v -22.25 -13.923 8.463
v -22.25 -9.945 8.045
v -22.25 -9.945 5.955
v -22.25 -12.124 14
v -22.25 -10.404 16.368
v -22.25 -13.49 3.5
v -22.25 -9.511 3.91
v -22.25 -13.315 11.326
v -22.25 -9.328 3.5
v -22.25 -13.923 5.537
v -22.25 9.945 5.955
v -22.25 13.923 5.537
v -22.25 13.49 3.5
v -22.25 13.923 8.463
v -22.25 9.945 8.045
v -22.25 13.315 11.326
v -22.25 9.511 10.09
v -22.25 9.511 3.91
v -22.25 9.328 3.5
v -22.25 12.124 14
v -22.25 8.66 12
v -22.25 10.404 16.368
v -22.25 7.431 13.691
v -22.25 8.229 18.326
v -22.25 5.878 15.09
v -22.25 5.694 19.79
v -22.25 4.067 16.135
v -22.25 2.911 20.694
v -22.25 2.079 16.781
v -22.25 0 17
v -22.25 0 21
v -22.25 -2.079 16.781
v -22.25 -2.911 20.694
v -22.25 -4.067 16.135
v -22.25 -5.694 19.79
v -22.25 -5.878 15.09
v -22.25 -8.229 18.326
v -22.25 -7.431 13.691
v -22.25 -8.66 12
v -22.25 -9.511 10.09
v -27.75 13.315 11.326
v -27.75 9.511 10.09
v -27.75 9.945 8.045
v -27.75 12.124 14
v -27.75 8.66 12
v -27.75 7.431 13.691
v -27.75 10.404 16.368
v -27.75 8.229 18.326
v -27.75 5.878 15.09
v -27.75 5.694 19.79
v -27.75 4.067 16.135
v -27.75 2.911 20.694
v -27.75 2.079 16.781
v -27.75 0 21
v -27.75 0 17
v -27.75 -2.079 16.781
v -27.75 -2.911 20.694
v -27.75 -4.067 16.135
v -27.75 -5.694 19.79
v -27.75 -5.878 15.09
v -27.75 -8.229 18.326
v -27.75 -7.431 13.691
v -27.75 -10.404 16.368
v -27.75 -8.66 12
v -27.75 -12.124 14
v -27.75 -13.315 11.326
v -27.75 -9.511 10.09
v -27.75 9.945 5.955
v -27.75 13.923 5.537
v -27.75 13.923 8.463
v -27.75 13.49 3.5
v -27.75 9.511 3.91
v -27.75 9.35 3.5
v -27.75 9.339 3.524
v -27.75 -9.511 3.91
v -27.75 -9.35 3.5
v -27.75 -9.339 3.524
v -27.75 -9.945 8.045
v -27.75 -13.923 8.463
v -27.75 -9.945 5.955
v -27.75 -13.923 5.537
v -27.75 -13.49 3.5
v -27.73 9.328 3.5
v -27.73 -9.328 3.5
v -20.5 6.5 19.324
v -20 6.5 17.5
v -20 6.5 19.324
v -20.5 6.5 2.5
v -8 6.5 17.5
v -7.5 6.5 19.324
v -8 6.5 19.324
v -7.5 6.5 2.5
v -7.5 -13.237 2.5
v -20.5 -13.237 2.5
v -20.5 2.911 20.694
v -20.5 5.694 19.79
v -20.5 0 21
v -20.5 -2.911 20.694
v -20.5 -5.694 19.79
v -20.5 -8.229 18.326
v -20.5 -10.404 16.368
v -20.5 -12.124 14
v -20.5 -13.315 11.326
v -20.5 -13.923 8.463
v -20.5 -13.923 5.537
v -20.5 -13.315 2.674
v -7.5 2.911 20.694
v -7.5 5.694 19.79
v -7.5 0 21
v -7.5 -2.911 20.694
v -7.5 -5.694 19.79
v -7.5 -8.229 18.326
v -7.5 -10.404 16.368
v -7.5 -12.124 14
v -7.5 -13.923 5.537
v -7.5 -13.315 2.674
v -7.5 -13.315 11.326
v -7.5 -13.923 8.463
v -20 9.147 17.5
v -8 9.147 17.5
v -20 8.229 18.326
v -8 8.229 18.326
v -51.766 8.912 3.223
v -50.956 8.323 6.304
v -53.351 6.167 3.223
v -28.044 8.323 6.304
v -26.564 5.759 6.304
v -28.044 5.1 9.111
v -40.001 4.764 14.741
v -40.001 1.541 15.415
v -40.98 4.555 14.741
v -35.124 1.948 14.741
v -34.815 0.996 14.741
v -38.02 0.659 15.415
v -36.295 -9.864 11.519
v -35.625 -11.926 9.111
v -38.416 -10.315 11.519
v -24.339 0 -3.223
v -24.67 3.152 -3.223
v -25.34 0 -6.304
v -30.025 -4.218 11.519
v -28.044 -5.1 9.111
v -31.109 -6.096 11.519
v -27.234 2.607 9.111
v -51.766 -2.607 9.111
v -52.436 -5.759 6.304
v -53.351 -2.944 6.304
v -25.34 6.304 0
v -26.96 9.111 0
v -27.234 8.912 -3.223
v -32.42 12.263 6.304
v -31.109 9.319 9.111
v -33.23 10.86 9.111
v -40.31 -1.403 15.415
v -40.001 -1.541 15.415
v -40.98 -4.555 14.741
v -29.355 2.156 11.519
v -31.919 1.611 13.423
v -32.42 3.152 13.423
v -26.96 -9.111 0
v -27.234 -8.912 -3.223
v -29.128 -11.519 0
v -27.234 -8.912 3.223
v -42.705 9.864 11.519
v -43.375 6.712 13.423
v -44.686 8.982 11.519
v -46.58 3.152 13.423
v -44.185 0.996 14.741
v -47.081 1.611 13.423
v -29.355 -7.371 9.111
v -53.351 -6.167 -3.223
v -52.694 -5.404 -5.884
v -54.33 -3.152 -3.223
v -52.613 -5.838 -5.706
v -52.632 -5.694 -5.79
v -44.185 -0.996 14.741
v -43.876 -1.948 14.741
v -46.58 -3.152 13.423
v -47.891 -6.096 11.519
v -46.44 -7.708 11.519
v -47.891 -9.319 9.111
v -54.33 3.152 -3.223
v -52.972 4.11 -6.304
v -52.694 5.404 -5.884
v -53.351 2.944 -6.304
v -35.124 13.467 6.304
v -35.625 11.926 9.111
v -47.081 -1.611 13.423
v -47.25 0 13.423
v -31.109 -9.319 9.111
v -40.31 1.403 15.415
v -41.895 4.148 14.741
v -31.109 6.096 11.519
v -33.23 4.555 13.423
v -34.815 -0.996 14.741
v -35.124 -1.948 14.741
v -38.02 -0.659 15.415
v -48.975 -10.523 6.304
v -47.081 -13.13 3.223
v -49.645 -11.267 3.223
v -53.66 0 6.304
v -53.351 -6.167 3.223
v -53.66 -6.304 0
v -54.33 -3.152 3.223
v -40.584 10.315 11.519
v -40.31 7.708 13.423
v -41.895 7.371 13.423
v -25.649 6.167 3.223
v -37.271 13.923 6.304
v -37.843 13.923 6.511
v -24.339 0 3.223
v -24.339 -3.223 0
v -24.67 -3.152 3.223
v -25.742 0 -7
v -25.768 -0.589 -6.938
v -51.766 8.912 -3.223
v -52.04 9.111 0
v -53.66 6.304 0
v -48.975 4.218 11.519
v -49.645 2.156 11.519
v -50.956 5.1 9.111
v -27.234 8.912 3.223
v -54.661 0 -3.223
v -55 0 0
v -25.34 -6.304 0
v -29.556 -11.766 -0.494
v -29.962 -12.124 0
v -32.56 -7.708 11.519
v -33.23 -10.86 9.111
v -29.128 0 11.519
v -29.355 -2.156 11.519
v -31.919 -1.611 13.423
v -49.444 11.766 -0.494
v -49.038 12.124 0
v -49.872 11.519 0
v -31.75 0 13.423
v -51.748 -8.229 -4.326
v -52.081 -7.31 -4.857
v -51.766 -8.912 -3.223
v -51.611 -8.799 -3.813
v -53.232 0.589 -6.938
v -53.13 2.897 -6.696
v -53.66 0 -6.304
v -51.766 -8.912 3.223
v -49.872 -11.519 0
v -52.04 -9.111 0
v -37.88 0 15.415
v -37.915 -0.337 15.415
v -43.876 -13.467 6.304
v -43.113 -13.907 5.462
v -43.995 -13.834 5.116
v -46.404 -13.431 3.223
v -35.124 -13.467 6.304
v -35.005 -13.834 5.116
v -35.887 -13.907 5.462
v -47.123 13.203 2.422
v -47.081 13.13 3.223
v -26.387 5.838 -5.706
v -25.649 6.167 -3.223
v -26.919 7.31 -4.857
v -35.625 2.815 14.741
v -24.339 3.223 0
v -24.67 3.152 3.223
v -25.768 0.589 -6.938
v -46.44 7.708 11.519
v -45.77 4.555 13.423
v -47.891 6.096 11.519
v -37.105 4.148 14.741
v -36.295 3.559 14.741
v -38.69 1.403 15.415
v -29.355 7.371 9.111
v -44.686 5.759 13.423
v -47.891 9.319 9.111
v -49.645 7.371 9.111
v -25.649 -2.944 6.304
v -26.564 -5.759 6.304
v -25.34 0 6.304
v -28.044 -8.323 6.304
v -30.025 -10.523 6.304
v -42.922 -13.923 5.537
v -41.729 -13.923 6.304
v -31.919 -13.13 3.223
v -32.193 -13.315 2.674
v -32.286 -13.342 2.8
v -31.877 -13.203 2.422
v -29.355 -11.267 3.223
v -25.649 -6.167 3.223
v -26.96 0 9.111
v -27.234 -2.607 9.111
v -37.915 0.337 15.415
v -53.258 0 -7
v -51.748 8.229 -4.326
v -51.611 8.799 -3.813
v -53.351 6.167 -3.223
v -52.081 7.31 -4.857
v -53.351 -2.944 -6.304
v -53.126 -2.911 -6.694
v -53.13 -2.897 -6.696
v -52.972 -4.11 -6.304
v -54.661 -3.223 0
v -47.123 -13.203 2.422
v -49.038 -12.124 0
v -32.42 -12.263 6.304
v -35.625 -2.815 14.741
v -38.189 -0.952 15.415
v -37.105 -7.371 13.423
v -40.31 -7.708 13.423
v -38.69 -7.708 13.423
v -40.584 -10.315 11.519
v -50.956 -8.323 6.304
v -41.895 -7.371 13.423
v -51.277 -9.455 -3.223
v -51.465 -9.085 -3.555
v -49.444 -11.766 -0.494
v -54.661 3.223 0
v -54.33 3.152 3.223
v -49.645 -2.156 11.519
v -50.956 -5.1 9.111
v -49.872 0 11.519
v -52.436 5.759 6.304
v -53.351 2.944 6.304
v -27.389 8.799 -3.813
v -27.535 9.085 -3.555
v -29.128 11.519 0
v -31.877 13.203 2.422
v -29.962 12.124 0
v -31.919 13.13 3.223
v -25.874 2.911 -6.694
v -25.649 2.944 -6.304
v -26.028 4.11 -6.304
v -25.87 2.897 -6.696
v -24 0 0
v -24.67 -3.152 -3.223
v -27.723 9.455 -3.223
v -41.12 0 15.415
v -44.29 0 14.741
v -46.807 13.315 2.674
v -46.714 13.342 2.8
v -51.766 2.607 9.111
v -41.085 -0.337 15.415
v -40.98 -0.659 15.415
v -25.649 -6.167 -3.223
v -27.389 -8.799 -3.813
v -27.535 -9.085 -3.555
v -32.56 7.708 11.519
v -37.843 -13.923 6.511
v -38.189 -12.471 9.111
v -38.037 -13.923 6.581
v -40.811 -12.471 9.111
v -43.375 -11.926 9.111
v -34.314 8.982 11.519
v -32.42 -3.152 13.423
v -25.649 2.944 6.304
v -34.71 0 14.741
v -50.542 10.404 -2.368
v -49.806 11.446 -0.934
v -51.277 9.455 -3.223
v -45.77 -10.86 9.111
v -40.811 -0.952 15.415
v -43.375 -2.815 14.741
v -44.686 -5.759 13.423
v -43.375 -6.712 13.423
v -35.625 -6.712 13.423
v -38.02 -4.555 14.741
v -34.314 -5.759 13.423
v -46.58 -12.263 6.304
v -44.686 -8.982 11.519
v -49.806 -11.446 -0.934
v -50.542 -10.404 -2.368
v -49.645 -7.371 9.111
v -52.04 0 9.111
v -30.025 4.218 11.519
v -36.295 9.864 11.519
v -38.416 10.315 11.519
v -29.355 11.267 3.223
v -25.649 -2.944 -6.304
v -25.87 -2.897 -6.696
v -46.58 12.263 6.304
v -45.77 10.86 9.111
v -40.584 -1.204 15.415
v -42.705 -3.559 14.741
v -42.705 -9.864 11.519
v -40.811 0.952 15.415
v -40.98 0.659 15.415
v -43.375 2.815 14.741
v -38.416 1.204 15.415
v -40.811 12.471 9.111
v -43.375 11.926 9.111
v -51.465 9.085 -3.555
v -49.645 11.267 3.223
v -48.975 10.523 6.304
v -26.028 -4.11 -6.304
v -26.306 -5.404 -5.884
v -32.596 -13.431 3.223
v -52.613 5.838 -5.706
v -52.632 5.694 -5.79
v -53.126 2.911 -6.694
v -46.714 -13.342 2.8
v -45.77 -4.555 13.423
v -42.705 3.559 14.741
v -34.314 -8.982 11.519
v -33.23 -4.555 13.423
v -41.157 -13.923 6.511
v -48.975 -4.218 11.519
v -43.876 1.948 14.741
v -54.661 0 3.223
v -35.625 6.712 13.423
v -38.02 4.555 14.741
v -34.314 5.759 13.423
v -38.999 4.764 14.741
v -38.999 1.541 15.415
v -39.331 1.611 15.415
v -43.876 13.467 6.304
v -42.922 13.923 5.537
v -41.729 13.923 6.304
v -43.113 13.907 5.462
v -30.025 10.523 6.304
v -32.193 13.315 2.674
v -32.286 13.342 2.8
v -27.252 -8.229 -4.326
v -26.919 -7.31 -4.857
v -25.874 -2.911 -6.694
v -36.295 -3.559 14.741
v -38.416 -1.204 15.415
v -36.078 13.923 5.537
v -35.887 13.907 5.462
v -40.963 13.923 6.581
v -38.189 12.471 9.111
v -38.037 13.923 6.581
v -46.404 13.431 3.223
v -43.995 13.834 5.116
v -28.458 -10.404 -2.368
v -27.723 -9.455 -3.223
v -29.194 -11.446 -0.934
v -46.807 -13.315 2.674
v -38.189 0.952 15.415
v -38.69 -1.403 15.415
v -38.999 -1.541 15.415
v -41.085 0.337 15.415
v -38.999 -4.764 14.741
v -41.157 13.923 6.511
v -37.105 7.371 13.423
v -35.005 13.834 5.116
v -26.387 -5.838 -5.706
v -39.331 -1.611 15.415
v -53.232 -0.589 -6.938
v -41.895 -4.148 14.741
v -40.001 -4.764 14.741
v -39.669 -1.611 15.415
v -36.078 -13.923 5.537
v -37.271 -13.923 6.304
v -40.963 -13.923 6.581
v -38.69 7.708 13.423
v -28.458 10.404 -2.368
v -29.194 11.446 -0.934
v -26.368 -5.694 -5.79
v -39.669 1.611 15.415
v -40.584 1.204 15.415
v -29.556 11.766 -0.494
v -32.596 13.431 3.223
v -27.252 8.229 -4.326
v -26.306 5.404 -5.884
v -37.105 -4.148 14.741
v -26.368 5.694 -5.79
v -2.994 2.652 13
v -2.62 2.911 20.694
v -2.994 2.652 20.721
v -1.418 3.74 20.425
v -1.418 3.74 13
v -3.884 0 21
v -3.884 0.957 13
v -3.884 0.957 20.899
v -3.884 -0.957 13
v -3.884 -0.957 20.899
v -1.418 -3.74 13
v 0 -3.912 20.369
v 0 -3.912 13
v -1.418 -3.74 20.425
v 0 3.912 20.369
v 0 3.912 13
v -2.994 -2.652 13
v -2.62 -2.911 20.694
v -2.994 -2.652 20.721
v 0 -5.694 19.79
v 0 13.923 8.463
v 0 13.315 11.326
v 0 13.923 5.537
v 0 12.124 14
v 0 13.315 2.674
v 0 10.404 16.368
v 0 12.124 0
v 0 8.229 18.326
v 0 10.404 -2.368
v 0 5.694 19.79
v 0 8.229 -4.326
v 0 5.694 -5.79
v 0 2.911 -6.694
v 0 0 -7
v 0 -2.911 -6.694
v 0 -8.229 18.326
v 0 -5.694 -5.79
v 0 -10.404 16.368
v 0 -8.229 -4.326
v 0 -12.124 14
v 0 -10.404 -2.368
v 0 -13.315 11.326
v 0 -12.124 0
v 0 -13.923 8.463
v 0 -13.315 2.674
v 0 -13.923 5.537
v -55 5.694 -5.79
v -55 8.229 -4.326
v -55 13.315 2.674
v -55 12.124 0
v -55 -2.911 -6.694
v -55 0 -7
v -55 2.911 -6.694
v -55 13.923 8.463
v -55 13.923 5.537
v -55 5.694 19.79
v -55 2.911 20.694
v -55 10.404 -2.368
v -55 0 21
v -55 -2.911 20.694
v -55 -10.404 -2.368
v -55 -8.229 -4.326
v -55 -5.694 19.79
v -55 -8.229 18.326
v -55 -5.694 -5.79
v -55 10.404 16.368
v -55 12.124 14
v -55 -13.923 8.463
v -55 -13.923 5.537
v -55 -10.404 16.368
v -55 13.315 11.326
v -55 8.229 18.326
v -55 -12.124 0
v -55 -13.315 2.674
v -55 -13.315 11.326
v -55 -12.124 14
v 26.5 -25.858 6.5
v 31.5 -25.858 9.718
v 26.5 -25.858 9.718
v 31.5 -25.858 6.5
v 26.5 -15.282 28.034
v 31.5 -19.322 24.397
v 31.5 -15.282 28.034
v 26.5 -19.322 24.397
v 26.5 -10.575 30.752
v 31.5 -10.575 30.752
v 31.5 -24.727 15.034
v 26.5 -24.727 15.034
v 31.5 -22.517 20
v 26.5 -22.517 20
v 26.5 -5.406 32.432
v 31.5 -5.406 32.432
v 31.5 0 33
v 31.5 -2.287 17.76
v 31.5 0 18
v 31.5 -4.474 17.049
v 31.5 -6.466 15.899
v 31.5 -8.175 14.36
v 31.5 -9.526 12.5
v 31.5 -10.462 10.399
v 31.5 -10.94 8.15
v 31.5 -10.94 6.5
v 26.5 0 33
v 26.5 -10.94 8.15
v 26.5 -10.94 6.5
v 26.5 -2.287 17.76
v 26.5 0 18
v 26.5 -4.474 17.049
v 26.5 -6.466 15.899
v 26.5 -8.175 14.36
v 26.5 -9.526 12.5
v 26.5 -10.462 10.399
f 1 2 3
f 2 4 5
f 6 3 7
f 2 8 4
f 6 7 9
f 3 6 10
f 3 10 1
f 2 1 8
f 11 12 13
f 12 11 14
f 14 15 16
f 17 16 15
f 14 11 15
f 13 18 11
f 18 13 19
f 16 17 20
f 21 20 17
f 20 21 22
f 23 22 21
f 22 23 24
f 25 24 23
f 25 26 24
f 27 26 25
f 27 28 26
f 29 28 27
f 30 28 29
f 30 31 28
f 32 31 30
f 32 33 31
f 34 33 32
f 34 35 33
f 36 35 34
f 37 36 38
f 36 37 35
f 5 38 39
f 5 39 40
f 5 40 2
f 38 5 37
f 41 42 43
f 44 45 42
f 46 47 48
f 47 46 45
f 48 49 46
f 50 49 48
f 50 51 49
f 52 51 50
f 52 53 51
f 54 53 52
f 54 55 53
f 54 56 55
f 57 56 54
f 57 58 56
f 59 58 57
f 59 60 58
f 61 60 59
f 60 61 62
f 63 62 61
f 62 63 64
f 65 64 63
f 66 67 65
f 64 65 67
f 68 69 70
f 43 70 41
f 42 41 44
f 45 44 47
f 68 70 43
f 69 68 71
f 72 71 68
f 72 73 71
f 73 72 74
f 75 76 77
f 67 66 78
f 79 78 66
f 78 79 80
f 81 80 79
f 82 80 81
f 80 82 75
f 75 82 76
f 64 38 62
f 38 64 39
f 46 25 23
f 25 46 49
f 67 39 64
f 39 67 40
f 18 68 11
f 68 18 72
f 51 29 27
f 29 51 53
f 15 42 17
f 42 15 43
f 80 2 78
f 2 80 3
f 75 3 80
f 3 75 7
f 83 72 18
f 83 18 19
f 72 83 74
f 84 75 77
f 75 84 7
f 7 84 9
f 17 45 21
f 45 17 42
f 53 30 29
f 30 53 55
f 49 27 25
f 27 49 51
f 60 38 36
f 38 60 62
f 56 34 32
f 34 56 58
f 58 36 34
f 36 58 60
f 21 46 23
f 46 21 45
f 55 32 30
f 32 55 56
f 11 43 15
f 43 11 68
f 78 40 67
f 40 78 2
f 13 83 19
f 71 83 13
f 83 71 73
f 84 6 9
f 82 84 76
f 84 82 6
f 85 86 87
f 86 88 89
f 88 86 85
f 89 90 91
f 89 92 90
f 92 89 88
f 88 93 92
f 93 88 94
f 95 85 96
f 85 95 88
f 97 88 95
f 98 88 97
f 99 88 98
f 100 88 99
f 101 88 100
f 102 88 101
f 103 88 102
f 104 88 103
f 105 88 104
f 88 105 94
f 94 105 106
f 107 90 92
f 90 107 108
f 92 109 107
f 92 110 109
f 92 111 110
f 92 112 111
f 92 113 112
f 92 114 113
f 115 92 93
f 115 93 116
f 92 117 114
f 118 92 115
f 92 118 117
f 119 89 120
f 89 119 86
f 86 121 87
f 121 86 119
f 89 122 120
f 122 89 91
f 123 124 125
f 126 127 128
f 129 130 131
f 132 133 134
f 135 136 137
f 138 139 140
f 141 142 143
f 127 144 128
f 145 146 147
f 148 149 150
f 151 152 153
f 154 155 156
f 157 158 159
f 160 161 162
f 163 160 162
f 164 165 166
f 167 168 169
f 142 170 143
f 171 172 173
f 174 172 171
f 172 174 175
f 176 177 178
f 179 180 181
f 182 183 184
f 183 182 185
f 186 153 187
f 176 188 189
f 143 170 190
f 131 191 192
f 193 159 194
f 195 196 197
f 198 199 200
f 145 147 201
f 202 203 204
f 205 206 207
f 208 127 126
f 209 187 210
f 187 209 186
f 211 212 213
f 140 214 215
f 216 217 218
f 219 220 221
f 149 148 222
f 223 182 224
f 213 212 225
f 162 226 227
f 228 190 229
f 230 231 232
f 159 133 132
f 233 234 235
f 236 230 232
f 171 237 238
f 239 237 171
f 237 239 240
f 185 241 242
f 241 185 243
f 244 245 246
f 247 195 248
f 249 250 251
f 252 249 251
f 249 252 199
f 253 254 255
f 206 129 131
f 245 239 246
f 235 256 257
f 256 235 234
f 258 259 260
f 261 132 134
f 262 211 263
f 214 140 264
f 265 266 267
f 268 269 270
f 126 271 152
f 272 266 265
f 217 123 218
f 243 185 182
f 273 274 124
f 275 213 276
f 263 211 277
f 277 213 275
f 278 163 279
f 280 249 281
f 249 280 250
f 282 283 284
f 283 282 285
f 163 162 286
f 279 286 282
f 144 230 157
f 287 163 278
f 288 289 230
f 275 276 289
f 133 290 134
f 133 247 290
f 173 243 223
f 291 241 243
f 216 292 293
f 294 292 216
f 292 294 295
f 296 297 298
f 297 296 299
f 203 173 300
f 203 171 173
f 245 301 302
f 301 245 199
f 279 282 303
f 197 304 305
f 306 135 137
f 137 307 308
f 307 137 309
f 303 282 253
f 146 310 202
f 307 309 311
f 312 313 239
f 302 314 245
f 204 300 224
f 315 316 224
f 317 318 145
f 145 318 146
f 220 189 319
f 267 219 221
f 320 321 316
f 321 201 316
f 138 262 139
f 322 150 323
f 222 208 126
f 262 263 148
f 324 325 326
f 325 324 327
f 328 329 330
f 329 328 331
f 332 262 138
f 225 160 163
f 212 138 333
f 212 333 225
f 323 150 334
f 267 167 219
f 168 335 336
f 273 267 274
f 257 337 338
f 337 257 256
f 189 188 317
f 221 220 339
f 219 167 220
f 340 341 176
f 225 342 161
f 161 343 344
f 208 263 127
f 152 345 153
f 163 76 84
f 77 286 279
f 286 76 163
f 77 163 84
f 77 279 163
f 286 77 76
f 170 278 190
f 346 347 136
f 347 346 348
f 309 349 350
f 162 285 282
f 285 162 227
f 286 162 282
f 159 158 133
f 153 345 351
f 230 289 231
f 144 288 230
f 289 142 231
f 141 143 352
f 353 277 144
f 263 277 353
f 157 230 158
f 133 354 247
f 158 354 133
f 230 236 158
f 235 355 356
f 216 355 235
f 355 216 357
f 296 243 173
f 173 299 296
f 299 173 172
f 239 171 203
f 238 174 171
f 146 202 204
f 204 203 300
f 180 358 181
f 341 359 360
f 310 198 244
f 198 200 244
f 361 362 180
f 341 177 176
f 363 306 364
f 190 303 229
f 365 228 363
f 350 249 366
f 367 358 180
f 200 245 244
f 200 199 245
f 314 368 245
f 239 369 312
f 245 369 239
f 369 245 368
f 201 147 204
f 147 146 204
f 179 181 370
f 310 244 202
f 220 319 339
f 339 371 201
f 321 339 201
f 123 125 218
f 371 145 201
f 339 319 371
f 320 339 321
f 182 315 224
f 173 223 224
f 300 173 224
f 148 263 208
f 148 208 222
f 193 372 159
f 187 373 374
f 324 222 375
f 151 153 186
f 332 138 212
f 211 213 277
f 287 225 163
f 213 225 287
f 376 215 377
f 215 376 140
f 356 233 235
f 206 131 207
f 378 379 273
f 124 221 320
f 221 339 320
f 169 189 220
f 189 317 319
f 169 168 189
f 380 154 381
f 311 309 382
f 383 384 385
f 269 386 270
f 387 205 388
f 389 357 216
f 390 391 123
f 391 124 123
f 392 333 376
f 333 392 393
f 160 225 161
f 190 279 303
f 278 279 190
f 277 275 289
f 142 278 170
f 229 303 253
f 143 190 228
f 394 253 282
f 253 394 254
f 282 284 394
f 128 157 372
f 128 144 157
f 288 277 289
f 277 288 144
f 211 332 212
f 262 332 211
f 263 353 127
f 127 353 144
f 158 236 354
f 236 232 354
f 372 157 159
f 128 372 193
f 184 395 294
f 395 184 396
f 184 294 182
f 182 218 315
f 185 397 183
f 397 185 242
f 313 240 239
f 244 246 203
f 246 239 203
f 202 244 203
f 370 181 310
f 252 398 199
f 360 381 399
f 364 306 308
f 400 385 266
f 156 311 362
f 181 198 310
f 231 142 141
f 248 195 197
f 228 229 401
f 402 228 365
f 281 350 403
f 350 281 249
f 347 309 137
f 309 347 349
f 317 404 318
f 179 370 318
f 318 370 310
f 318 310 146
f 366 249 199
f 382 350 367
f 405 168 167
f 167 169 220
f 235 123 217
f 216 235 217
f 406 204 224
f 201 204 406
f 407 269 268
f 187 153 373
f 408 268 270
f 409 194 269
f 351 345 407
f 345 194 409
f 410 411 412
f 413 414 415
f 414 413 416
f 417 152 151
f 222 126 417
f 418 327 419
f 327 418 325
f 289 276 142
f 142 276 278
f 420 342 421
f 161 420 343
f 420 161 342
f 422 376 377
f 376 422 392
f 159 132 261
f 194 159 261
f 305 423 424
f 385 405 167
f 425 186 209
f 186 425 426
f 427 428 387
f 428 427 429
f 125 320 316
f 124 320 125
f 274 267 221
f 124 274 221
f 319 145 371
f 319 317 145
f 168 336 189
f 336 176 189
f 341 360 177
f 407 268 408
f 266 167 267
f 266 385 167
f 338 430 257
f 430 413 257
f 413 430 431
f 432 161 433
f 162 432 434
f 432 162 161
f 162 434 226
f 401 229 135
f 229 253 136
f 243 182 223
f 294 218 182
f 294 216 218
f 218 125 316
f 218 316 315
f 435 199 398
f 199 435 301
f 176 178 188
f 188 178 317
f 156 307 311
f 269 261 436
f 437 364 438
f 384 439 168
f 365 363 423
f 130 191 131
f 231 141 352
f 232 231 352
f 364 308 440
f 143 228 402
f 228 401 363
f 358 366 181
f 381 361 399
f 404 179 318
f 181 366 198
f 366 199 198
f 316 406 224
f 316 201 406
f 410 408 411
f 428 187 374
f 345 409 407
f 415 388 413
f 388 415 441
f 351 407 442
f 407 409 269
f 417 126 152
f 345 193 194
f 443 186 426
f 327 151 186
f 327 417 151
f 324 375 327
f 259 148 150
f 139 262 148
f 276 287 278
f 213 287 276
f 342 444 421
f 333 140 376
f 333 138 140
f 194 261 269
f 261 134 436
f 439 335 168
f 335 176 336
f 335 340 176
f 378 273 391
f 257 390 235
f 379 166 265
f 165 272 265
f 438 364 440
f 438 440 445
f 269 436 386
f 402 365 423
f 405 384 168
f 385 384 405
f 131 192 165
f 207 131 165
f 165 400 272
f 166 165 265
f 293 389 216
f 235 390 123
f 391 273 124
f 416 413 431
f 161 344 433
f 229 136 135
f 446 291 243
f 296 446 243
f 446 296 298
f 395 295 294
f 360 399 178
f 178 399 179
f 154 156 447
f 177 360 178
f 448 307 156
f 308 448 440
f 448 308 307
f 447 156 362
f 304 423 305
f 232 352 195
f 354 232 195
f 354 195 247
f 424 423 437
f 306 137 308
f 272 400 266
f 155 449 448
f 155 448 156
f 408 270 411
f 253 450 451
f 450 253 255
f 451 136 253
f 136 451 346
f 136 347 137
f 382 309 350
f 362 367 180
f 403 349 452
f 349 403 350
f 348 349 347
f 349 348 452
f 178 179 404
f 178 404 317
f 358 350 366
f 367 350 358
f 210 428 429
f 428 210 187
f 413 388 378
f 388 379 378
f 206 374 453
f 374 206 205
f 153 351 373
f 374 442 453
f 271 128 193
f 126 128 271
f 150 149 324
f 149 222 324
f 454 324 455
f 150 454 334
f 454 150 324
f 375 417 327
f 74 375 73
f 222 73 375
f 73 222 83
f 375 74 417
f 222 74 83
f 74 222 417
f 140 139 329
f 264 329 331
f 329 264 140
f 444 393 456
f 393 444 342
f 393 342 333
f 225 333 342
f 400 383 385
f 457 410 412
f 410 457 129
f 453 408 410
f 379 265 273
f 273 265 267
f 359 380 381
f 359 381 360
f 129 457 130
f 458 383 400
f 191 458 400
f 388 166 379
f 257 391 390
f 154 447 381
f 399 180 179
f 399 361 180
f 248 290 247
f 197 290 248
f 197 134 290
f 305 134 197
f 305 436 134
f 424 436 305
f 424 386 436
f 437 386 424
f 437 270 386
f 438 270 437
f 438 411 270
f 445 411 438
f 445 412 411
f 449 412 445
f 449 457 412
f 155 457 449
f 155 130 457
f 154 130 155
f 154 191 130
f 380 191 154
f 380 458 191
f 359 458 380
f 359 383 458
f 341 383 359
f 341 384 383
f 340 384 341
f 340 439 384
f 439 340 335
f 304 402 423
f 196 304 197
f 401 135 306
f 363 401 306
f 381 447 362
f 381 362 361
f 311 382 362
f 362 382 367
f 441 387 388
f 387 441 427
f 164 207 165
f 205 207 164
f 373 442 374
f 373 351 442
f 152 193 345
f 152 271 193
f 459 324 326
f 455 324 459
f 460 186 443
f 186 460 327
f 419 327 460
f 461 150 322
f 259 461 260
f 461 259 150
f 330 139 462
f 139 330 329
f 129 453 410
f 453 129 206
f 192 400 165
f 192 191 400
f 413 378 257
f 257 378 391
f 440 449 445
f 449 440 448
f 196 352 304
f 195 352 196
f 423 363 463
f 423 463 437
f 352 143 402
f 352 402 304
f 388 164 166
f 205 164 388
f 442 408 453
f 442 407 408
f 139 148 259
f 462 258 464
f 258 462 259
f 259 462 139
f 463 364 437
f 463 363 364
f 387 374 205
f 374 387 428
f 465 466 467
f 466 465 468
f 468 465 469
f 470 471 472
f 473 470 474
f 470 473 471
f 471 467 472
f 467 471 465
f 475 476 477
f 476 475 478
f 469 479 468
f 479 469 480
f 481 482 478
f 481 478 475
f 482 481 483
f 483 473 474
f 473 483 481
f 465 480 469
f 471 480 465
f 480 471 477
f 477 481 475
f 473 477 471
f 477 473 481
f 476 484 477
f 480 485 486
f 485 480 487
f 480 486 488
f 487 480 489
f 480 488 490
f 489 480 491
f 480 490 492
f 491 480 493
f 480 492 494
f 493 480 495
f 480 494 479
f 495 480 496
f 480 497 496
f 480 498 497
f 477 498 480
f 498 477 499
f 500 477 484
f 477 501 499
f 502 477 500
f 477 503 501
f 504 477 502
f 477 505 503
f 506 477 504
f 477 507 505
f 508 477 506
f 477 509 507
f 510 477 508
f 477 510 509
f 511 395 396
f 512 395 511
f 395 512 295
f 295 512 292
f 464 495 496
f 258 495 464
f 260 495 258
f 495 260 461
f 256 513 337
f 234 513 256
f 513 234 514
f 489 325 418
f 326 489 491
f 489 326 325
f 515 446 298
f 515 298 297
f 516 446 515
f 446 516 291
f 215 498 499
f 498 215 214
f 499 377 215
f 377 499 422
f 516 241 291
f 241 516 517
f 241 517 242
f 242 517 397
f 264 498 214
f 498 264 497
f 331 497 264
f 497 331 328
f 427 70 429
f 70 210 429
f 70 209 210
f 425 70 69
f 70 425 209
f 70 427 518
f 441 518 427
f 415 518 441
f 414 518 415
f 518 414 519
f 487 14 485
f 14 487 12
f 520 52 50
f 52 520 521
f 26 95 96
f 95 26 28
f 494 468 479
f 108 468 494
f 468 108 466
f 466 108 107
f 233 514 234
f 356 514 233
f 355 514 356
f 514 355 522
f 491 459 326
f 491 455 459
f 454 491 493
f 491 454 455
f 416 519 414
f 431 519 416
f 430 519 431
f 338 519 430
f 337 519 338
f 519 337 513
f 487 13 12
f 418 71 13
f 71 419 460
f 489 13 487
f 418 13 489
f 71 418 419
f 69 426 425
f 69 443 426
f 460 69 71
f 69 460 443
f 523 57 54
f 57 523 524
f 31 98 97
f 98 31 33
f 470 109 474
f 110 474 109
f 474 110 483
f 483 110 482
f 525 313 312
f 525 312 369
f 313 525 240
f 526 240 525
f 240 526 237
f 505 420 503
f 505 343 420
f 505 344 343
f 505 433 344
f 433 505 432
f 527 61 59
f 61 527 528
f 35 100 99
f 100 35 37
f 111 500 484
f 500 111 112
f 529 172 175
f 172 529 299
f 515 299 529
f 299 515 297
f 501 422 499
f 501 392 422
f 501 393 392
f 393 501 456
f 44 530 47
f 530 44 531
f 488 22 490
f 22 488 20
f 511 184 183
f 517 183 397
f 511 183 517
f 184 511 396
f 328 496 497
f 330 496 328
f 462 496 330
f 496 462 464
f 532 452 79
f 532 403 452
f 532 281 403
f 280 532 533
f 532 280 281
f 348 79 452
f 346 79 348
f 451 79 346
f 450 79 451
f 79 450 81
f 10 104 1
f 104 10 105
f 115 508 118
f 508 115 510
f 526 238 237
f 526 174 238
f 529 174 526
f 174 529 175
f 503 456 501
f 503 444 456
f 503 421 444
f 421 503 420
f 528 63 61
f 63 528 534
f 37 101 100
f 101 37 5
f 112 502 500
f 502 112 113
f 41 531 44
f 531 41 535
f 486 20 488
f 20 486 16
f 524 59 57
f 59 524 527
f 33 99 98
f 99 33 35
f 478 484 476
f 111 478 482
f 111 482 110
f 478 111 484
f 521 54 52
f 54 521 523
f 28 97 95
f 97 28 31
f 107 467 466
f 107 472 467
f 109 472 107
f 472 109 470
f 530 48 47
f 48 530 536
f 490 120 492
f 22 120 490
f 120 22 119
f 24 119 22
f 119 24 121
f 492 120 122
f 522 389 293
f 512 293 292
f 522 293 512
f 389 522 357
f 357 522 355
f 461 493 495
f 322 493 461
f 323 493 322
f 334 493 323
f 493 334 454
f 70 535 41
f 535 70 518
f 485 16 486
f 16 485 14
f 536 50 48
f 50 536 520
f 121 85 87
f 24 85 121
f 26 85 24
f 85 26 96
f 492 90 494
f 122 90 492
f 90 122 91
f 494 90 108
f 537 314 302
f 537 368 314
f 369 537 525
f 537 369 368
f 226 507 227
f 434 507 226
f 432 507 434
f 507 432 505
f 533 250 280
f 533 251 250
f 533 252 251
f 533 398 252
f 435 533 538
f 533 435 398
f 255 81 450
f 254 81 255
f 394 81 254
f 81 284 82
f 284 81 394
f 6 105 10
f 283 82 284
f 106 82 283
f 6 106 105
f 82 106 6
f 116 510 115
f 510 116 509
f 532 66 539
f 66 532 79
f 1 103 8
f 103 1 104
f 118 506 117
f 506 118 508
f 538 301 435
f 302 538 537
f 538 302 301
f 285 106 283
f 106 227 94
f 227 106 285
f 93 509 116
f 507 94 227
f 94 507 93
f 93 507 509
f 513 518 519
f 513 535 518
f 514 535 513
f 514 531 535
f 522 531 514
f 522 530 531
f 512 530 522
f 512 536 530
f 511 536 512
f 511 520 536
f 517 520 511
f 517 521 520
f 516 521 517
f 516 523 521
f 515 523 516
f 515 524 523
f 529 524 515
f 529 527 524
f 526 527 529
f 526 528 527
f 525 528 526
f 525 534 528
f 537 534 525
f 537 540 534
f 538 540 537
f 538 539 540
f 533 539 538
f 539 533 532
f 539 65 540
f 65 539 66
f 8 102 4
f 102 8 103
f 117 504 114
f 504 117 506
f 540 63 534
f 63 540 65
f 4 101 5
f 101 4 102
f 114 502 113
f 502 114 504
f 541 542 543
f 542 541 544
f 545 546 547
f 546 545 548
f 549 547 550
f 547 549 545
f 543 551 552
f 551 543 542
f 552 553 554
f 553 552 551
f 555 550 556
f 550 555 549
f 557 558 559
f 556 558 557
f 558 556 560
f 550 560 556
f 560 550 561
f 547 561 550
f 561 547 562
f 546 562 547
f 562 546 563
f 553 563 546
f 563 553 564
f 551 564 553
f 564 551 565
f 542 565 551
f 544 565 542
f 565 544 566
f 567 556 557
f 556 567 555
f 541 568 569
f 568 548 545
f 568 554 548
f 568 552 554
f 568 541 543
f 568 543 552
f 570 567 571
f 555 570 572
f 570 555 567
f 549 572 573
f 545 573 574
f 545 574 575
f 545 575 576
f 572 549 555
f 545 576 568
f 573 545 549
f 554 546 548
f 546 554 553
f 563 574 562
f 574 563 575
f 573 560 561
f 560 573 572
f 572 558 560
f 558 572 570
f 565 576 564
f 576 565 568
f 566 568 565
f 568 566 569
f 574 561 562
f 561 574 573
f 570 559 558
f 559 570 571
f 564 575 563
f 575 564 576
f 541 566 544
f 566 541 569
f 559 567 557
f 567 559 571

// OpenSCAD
/*difference() {
   sphere(14);
    translate([0,0,20]){
        cube([40, 40, 48], true);
    } 
    sphere(14);
    translate([0,5,20]){
        cube([40, 40, 48], true);
    } 
}*/


module outer_ring(){
    difference() {

        translate([-21,0,7]) {
            //cube([110, 26, 27], true);
            rotate([0,90,0]) {
                cylinder(5, 26, 26, true);
            }
        }
        
        translate([-20,0,7]) {
            
            rotate([0,90,0]) {
                cylinder(10, 11, 11, true);
            }
        }
        
        translate([-20,-20,-7]) {
            cube([110, 126, 27], true);
        }
        
        translate([20,20,19]) {
            cube([110, 40, 30], true);
        }
        
    }
}



module inner_ring(x1, x2){
    difference() {

        translate([x1,0,7]) {
            //cube([110, 26, 27], true);
            rotate([0,90,0]) {
                cylinder(5.5, 30, 30, true);
            }
        }
        
        translate([x2,0,7]) {
            //cube([110, 26, 27], true);
            rotate([0,90,0]) {
                cylinder(10, 10, 10, true);
            }
        }
        
        translate([x2,0,-10]) {
            cube([30, 66, 27], true);
            
        }
        
    }
}



difference() {
    

    translate([0,0,7]) {
        //cube([110, 26, 27], true);
        rotate([0,90,0]) {
            cylinder(110, 14, 14, true);
        }
    }
    
    cutaway();

}


module cutaway() {
    inner_ring(-25, -24);
    inner_ring(25, 24);
    
    translate([-39.5,0,0]) {
        sphere(15.5);  
    }

    translate([39.5,0,0]) {
        sphere(15.5);  
    }

    //translate([0,25,0]) {
    //    cube([120, 50, 57], true);
    //}
    translate([0,0,18]) {
        cylinder(10,4,4, true);
    }
    
    translate([-14,-5,13.5]) {
        rotate([0,0,90]) {
            9g_motor1();
        }
    }

    translate([14,-5,13.5]) {
        rotate([0,0,90]) {
            9g_motor1();
        }
    }
    
    translate([50,0,0]) {
        cube([100,100,100], true);
    }
    
}

translate([50,0,0]){
   outer_ring(-25, -24.5);
}


 //9g_motor1();

module 9g_motor1(){
	difference(){			
		union(){
			color("steel blue") cube([23,13,22], center=true);
			color("steel blue") translate([0,0,5]) cube([32,12,2], center=true);
			color("steel blue") translate([5.5,0,2.75]) cylinder(r=6, h=25.75, $fn=20, center=true);
			color("steel blue") translate([-.5,0,2.75]) cylinder(r=1, h=25.75, $fn=20, center=true);
			color("steel blue") translate([-1,0,2.75]) cube([5,5.6,24.5], center=true);		
			color("white") translate([5.5,0,3.65]) cylinder(r=2.35, h=29.25, $fn=20, center=true);				
		}
		//translate([10,0,-11]) rotate([0,-30,0]) cube([8,13,4], center=true);
		//for ( hole = [14,-14] ){
		//	translate([hole,0,5]) cylinder(r=2.2, h=4, $fn=20, center=true);
		//}	
	}
}
